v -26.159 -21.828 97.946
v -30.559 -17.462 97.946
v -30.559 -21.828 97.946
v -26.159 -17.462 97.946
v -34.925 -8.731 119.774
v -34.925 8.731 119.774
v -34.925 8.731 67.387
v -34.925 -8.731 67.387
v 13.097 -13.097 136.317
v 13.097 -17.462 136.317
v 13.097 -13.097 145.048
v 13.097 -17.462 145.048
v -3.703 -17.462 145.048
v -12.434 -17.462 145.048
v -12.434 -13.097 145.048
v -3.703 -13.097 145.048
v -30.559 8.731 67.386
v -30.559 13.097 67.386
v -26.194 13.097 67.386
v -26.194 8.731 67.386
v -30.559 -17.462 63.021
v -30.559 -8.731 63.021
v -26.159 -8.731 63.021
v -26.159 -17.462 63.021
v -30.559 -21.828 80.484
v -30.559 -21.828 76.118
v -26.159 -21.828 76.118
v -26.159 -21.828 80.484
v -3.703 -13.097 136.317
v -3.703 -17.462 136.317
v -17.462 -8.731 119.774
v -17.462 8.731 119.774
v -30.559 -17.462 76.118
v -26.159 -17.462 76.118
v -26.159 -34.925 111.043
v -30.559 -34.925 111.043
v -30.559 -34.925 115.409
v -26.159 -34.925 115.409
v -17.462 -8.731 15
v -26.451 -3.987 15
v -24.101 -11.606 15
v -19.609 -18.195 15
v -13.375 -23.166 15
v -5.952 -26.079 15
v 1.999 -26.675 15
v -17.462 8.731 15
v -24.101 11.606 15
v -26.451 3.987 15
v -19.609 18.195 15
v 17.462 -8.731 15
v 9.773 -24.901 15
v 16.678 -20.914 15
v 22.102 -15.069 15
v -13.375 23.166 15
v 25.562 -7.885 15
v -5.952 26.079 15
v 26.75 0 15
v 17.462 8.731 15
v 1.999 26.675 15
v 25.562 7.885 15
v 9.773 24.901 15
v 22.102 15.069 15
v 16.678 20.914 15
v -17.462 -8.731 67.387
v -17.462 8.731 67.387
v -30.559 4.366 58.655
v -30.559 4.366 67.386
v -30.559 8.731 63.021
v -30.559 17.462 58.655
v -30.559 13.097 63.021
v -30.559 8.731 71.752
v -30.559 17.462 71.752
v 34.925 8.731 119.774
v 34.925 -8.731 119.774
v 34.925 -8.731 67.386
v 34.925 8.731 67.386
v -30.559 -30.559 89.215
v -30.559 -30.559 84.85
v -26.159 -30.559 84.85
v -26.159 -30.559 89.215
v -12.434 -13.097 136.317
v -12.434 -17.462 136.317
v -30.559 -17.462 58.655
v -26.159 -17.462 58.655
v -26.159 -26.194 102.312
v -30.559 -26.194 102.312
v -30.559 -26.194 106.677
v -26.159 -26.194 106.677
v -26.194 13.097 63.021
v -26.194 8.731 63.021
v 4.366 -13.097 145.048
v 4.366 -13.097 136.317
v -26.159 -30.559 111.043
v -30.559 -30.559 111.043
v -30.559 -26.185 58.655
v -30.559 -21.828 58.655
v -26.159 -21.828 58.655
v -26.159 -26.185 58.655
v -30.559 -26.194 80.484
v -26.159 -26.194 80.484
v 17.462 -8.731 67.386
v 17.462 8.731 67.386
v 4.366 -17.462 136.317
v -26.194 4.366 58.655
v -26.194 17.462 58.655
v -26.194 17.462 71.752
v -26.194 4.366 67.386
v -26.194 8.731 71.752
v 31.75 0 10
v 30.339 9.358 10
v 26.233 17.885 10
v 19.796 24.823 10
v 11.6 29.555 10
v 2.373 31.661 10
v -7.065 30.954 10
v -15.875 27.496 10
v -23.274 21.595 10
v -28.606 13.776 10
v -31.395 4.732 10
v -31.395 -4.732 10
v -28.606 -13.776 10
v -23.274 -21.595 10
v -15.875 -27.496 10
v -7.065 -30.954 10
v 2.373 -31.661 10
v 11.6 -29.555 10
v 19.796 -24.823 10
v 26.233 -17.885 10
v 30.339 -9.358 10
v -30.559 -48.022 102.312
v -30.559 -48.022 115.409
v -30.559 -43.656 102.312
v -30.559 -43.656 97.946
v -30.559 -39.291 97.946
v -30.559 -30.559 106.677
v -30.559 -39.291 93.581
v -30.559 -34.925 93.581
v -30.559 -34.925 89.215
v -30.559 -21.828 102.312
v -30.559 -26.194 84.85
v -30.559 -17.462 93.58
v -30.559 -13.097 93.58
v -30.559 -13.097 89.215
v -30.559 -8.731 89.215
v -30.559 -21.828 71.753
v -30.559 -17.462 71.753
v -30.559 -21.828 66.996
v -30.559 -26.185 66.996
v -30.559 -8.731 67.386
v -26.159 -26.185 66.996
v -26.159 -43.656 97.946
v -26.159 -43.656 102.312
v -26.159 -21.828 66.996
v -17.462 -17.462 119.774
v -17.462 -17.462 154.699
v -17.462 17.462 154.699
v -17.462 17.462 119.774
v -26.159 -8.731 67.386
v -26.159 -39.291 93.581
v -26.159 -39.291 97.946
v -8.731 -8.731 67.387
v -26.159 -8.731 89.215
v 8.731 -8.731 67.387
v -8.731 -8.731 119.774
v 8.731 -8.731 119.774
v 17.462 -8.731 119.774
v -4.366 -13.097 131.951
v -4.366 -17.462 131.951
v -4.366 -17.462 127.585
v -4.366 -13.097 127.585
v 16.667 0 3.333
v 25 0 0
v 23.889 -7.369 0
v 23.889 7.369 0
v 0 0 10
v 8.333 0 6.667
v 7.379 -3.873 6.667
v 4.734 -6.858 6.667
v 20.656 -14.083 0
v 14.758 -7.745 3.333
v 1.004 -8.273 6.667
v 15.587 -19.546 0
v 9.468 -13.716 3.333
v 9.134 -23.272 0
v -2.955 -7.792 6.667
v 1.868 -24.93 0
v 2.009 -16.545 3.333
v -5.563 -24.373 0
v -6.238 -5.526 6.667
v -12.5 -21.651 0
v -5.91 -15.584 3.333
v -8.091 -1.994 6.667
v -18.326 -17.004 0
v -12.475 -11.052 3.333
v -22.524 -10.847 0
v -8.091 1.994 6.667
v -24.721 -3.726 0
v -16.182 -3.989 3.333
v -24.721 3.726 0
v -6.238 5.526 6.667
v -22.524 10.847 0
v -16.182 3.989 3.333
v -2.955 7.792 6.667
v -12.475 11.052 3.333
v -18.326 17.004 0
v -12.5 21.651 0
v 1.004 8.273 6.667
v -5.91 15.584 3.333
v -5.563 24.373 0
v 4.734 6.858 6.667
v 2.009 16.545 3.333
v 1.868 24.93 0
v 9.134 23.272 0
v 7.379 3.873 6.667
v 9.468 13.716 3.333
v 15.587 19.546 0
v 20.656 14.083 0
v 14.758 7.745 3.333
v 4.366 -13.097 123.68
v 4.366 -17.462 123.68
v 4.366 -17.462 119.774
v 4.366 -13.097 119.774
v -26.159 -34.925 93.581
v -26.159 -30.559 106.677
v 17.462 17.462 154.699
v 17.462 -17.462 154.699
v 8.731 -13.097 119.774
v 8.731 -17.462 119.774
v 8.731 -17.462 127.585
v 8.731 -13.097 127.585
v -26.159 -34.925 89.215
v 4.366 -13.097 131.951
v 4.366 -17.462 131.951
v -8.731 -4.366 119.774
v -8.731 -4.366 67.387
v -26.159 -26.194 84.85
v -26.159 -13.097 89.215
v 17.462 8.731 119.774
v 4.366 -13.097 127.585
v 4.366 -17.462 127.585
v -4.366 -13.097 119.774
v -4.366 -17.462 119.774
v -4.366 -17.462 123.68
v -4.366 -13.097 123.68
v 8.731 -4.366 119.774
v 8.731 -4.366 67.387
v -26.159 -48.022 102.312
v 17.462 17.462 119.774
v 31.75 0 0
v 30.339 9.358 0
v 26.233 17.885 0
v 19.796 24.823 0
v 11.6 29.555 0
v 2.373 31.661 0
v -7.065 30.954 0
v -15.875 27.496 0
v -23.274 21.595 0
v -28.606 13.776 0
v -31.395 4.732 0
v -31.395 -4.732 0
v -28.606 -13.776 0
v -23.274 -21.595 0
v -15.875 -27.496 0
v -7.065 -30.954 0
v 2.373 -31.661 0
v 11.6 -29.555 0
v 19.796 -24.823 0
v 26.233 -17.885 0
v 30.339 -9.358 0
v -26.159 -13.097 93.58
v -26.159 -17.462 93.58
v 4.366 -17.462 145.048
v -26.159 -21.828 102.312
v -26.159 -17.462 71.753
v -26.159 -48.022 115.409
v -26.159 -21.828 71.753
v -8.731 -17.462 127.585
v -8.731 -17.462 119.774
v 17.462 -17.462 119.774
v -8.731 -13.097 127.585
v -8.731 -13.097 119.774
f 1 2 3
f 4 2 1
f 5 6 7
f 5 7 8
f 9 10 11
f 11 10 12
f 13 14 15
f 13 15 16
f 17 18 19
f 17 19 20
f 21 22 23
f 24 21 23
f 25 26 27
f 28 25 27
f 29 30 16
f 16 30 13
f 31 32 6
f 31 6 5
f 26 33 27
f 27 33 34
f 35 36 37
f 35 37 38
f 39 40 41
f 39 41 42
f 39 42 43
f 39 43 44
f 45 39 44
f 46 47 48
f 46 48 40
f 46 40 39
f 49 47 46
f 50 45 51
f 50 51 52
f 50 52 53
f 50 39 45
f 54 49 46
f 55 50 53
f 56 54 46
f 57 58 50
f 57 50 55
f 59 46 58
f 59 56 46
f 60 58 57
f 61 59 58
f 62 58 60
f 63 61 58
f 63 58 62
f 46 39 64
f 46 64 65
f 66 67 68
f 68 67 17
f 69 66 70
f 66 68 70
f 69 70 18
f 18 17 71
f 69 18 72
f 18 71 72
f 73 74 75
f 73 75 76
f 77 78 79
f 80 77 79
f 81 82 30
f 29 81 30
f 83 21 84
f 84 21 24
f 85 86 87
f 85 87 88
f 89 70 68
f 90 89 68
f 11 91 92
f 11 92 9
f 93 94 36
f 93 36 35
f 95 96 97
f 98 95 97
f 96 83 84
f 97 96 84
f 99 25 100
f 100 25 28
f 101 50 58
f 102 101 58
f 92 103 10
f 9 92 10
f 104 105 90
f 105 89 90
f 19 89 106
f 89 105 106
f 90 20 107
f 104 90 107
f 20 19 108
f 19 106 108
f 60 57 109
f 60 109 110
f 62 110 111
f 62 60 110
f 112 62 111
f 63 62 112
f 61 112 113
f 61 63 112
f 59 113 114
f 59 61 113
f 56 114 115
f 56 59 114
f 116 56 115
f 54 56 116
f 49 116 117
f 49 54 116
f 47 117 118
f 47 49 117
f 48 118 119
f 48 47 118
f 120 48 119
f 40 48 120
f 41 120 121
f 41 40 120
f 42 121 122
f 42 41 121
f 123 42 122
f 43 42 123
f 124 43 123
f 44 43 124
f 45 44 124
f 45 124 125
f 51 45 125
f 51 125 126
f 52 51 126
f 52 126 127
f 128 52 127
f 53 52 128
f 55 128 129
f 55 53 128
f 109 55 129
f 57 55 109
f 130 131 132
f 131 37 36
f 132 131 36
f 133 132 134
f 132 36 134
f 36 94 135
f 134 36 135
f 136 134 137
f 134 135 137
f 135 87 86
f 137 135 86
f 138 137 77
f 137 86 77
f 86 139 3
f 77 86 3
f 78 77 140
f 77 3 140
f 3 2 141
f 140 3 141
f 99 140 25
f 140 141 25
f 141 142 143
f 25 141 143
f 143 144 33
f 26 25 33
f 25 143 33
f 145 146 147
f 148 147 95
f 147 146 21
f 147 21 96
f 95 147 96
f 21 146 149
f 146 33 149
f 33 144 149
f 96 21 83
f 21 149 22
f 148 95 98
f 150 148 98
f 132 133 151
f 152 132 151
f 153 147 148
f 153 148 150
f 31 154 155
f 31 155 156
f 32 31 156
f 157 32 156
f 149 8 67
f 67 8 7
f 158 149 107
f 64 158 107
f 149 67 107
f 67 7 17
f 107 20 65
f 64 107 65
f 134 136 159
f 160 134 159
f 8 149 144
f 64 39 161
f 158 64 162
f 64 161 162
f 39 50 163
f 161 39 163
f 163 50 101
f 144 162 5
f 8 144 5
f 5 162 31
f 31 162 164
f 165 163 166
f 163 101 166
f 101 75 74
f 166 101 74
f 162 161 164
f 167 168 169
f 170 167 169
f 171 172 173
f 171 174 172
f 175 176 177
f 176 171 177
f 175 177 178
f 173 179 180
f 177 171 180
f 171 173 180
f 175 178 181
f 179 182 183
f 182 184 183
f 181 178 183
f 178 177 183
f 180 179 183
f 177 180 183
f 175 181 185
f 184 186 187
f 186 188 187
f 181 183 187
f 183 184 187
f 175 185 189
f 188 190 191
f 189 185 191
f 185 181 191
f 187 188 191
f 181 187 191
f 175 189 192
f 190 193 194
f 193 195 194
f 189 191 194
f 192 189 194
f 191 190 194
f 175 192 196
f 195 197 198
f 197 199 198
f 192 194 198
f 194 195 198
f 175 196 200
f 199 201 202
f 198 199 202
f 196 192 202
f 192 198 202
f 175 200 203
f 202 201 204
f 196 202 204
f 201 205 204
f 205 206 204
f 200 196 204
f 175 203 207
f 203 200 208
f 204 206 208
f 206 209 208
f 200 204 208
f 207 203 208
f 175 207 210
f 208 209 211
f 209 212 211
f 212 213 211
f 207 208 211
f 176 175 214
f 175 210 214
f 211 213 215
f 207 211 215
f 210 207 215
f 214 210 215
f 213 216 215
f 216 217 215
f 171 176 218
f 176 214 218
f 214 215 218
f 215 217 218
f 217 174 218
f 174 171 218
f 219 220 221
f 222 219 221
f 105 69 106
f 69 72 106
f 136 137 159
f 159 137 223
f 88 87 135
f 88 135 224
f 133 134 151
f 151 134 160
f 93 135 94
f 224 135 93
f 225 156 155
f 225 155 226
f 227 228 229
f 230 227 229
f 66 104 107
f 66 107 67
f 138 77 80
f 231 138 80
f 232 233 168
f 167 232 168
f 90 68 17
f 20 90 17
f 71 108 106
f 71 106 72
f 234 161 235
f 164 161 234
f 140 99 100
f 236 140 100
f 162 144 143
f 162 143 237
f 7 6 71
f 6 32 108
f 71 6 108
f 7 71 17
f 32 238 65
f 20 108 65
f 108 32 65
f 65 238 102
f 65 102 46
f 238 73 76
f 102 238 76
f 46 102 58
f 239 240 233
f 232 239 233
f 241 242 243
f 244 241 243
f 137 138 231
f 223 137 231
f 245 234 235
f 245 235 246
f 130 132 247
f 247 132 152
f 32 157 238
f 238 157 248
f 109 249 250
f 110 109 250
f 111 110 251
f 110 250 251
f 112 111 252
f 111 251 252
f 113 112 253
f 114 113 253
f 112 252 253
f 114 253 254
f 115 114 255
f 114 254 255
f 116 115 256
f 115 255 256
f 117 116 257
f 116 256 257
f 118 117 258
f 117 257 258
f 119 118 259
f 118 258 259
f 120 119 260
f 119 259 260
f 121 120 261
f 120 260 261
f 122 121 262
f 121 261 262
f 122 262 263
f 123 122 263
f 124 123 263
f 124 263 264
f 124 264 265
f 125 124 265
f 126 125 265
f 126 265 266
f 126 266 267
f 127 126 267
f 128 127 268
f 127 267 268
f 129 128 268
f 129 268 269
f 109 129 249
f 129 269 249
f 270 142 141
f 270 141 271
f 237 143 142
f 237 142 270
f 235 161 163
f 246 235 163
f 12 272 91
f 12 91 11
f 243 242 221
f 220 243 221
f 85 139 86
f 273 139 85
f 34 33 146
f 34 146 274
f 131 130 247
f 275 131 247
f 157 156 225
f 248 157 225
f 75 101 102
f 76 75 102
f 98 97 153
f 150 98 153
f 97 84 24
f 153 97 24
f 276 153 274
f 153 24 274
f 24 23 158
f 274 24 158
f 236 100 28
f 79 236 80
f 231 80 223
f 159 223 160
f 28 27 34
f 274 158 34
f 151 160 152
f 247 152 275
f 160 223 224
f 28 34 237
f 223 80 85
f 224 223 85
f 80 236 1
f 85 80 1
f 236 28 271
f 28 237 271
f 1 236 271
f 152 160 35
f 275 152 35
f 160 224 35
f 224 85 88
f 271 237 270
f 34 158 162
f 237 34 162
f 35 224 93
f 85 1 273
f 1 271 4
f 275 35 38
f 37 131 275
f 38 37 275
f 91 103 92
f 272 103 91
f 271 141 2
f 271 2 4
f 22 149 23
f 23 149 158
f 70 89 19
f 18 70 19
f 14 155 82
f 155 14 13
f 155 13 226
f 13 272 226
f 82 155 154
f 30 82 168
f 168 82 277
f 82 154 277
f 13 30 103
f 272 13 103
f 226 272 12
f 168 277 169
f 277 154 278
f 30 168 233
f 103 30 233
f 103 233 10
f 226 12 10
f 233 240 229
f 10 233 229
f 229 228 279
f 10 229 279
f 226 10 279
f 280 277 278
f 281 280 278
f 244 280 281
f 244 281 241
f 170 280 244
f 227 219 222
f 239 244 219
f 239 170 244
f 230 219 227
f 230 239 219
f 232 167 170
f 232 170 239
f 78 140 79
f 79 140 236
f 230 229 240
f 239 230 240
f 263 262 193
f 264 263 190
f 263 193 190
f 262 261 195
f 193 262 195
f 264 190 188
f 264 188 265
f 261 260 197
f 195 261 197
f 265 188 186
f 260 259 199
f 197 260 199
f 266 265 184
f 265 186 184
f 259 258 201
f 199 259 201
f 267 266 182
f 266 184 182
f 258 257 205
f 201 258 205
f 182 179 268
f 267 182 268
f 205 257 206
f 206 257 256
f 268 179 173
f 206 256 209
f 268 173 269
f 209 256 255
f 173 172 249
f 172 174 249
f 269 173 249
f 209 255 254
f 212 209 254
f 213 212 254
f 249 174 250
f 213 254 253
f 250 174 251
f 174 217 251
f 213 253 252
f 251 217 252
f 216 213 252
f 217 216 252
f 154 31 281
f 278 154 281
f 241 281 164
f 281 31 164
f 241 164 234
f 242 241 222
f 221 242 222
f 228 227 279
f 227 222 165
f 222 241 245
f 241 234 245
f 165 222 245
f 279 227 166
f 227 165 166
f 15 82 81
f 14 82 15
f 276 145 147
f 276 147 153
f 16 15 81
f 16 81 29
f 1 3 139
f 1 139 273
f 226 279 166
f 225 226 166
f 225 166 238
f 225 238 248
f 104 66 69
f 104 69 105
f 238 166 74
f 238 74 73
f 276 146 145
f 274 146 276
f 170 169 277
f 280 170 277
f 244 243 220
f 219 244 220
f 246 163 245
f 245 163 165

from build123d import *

# Parameters (mm, degrees)
F0_R      = 31.75
F1_DEPTH  = 15
F2_SIZE   = 5
F3_R      = 25
F4_DEPTH  = 10
F5_SIZE2  = 9.99999
F5_SIZE   = 24.99999
F6_W      = 34.925
F6_H      = 17.4625
F7_DEPTH  = 104.774
F10_W     = 34.925
F10_H     = 34.925
F11_DEPTH = 34.925
F12_W     = 17.4625
F12_H     = 17.4625
F13_DEPTH = 17.4625
F14_DEPTH = 34.925
F15_W     = 17.4625
F15_H     = 17.4625
F15_H_2   = 34.925
F16_DEPTH = 17.4625
F19_W     = 8.73125
F19_H     = 8.73125
F20_DEPTH = 4.365625
F17_W     = 4.365625
F17_H     = 4.365625
F23_DEPTH = 4.365625
F24_DEPTH = 4.365625
F25_W     = 4.4006995887
F25_H     = 4.365625
F26_DEPTH = 4.365625
F27_DEPTH = 8.73125
F28_W     = 4.4006995887
F28_H     = 4.365625
F29_DEPTH = 4.365625
F30_W     = 4.4006995887
F30_H     = 4.365625
F31_DEPTH = 4.365625
F32_W     = 4.4006995887
F32_H     = 4.365
F33_DEPTH = 4.365625
F34_DEPTH = 8.73125
F35_W     = 4.4006995887
F35_H     = 4.365
F36_DEPTH = 4.365625
F37_DEPTH = 8.73125
F38_W     = 4.4006995887
F38_H     = 4.365
F39_DEPTH = 4.365625
F40_DEPTH = 8.73125
F42_W     = 4.365625
F42_H     = 4.365625
F43_DEPTH = 4.365625
F44_DEPTH = 4.365625
F46_DEPTH = 8.73125
F47_W     = 4.365625
F47_H     = 4.365625
F48_DEPTH = 25
F41_W     = 4.4006995887
F41_H     = 4.365
F49_DEPTH = 4.365625
F50_DEPTH = 8.73125
F51_W     = 4.4006995887
F51_H     = 4.365
F52_DEPTH = 4.365625
F53_DEPTH = 8.73215
F54_W     = 4.4006995887
F54_H     = 4.3659
F55_DEPTH = 4.365625
F56_DEPTH = 4.365625
F57_W     = 4.4006995887
F57_H     = 4.365625
F58_DEPTH = 4.365625
F59_W     = 4.4006995887
F59_H     = 8.73125
F60_DEPTH = 4.365625
F61_DEPTH = 4.365625
F62_DEPTH = 4.365625
F63_DEPTH = 4.365625
F64_W     = 4.4006995887
F64_H     = 8.73125
F65_DEPTH = 4.365625
F66_W     = 4.4006995887
F66_H     = 4.36625
F66_H_2   = 4.365625
F67_DEPTH = 4.365625
F68_W     = 4.4006995887
F68_H     = 4.365625
F69_DEPTH = 4.365625
F70_W     = 4.4006995887
F70_H     = 4.4238492846
F70_H_2   = 3.9164990911
F71_DEPTH = 4.3565625
F21_W     = 17.4625
F21_H     = 52.3875
F72_DEPTH = 4.365625


# Not quite as in the source:
# - a fillet or chamfer is up to 0.001 mm smaller than in the source, because OpenCascade refuses the exact size


with BuildPart() as f1:
    # F0 (on Top) → F1 (new body)
    with BuildSketch(Plane.XY):
        Circle(F0_R)
    extrude(amount=F1_DEPTH)

    # F2
    f2_edges = [f1.edges().sort_by_distance(p)[0] for p in [
        (-31.75, 0, 15),
    ]]
    chamfer(f2_edges, length=F2_SIZE)

    # F3 (on face) → F4 (cut)
    with BuildSketch(Plane(origin=(0, 0, 0), x_dir=(1, 0, 0), z_dir=(0, 0, -1))):
        Circle(F3_R)
    extrude(amount=-F4_DEPTH, mode=Mode.SUBTRACT)

    # F5 (size 25 and 10 in the source; OpenCascade refuses exactly that, so slightly less here)
    f5_edges = [f1.edges().sort_by_distance(p)[0] for p in [
        (-25, 0, 10),
    ]]
    f5_side = f1.faces().sort_by_distance((0, 0, 10))[0]
    chamfer(f5_edges, length=F5_SIZE, length2=F5_SIZE2, reference=f5_side)

    # F6 (on face) → F7 (join)
    with BuildSketch(Plane.XY.offset(15)):
        Rectangle(F6_W, F6_H)
    extrude(amount=F7_DEPTH)

    # F10 (on face) → F11 (join)
    with BuildSketch(Plane.XY.offset(119.774)):
        Rectangle(F10_W, F10_H)
    extrude(amount=F11_DEPTH)

    # F12 (on face) → F13 (join)
    with BuildSketch(Plane.YZ.offset(17.4625)):
        with Locations((0, 111.04275)):
            Rectangle(F12_W, F12_H)
    extrude(amount=F13_DEPTH)

    # F14 (add): a face of the model
    f14_faces = [f1.faces().sort_by_distance(p)[0] for p in [
        (26.19375, 0, 102.3115),
    ]]
    extrude(f14_faces, amount=F14_DEPTH)

    # F15 (on face) → F16 (join)
    with BuildSketch(Plane(origin=(-17.4625, 0, 0), x_dir=(0, -1, 0), z_dir=(-1, 0, 0))):
        with Locations((0, 111.04275)):
            Rectangle(F15_W, F15_H)
        with Locations((0, 84.849)):
            Rectangle(F15_W, F15_H_2)
    extrude(amount=F16_DEPTH)

    # F19 (on face) → F20 (cut)
    with BuildSketch(Plane.XZ.offset(17.4625)):
        Polygon((-8.73125, 127.5853067636), (-8.73125, 119.774), (-4.365625, 119.774), (-4.365625, 123.6796533818), (4.365625, 123.6796533818), (4.365625, 119.774), (8.73125, 119.774), (8.73125, 127.5853067636), (4.365625, 127.5853067636), (4.365625, 131.9509317636), (-4.365625, 131.9509317636), (-4.365625, 127.5853067636), align=None)
        with Locations((-8.068405883, 140.6821817636)):
            Rectangle(F19_W, F19_H)
        with Locations((8.73125, 140.6821817636)):
            Rectangle(F19_W, F19_H)
    extrude(amount=-F20_DEPTH, mode=Mode.SUBTRACT)

    # F17 (on face) → F23 (join)
    with BuildSketch(Plane(origin=(0, 8.73125, 0), x_dir=(-1, 0, 0), z_dir=(0, 1, 0))):
        with Locations((28.3765625, 69.5693125)):
            Rectangle(F17_W, F17_H)
    extrude(amount=F23_DEPTH)

    # F24 (add): a face of the model
    f24_faces = [f1.faces().sort_by_distance(p)[0] for p in [
        (-28.3765625, 10.9140625, 71.752125),
    ]]
    extrude(f24_faces, amount=F24_DEPTH)

    # F25 (on face) → F26 (join)
    with BuildSketch(Plane.XZ.offset(8.73125)):
        with Locations((-28.3590252057, 69.5693125)):
            Rectangle(F25_W, F25_H)
    extrude(amount=F26_DEPTH)

    # F27 (add): a face of the model
    f27_faces = [f1.faces().sort_by_distance(p)[0] for p in [
        (-28.3590252057, -10.9140625, 71.752125),
    ]]
    extrude(f27_faces, amount=F27_DEPTH)

    # F28 (on face) → F29 (join)
    with BuildSketch(Plane.XZ.offset(13.096875)):
        with Locations((-28.3590252057, 73.9349375)):
            Rectangle(F28_W, F28_H)
        with Locations((-28.3590252057, 78.3005625)):
            Rectangle(F28_W, F28_H)
    extrude(amount=F29_DEPTH)

    # F30 (on face) → F31 (join)
    with BuildSketch(Plane.XY.offset(80.483375)):
        with Locations((-28.3590252057, -15.2796875)):
            Rectangle(F30_W, F30_H)
    extrude(amount=F31_DEPTH)

    # F32 (on face) → F33 (join)
    with BuildSketch(Plane.XZ.offset(17.4625)):
        with Locations((-28.3590252057, 78.300875)):
            Rectangle(F32_W, F32_H)
    extrude(amount=F33_DEPTH)

    # F34 (add): a face of the model
    f34_faces = [f1.faces().sort_by_distance(p)[0] for p in [
        (-28.3590252057, -19.6453125, 80.483375),
    ]]
    extrude(f34_faces, amount=F34_DEPTH)

    # F35 (on face) → F36 (join)
    with BuildSketch(Plane.XZ.offset(21.828125)):
        with Locations((-28.3590252057, 82.6665)):
            Rectangle(F35_W, F35_H)
    extrude(amount=F36_DEPTH)

    # F37 (add): a face of the model
    f37_faces = [f1.faces().sort_by_distance(p)[0] for p in [
        (-28.3590252057, -24.0109375, 84.849),
    ]]
    extrude(f37_faces, amount=F37_DEPTH)

    # F38 (on face) → F39 (join)
    with BuildSketch(Plane.XZ.offset(26.19375)):
        with Locations((-28.3590252057, 87.032125)):
            Rectangle(F38_W, F38_H)
    extrude(amount=F39_DEPTH)

    # F40 (add): a face of the model
    f40_faces = [f1.faces().sort_by_distance(p)[0] for p in [
        (-28.3590252057, -28.3765625, 89.214625),
    ]]
    extrude(f40_faces, amount=F40_DEPTH)

    # F42 (on face) → F43 (cut)
    with BuildSketch(Plane(origin=(0, 13.096875, 0), x_dir=(-1, 0, 0), z_dir=(0, 1, 0))):
        with Locations((28.3765625, 73.9349375)):
            Rectangle(F42_W, F42_H)
    extrude(amount=-F43_DEPTH, mode=Mode.SUBTRACT)

    # F44 (add): a face of the model
    f44_faces = [f1.faces().sort_by_distance(p)[0] for p in [
        (-28.3765625, 13.096875, 69.5693125),
    ]]
    extrude(f44_faces, amount=F44_DEPTH)

    # F45 (on face) → F46 (join)
    with BuildSketch(Plane(origin=(0, 0, 67.3865), x_dir=(1, 0, 0), z_dir=(0, 0, -1))):
        Polygon((-30.559375, -4.365625), (-30.559375, -8.73125), (-30.559375, -17.4625), (-26.19375, -17.4625), (-26.19375, -8.73125), (-26.19375, -4.365625), align=None)
    extrude(amount=F46_DEPTH)

    # F47 (on face) → F48 (cut)
    with BuildSketch(Plane(origin=(-30.559375, 0, 0), x_dir=(0, -1, 0), z_dir=(-1, 0, 0))):
        with Locations((-10.9140625, 65.2036875)):
            Rectangle(F47_W, F47_H)
    extrude(amount=-F48_DEPTH, mode=Mode.SUBTRACT)

    # F41 (on face) → F49 (join)
    with BuildSketch(Plane.XZ.offset(30.559375)):
        with Locations((-28.3590252057, 91.39775)):
            Rectangle(F41_W, F41_H)
    extrude(amount=F49_DEPTH)

    # F50 (add): a face of the model
    f50_faces = [f1.faces().sort_by_distance(p)[0] for p in [
        (-28.3590252057, -32.7421875, 93.58025),
    ]]
    extrude(f50_faces, amount=F50_DEPTH)

    # F51 (on face) → F52 (join)
    with BuildSketch(Plane.XZ.offset(34.925)):
        with Locations((-28.3590252057, 95.763375)):
            Rectangle(F51_W, F51_H)
    extrude(amount=F52_DEPTH)

    # F53 (add): a face of the model
    f53_faces = [f1.faces().sort_by_distance(p)[0] for p in [
        (-28.3590252057, -37.1078125, 97.945875),
    ]]
    extrude(f53_faces, amount=F53_DEPTH)

    # F54 (on face) → F55 (join)
    with BuildSketch(Plane.XZ.offset(39.290625)):
        with Locations((-28.3590252057, 100.12945)):
            Rectangle(F54_W, F54_H)
    extrude(amount=F55_DEPTH)

    # F56 (add): a face of the model
    f56_faces = [f1.faces().sort_by_distance(p)[0] for p in [
        (-28.3590252057, -41.4734375, 102.3124),
    ]]
    extrude(f56_faces, amount=F56_DEPTH)

    # F57 (on face) → F58 (join)
    with BuildSketch(Plane.XZ.offset(43.65625)):
        with Locations((-28.3590252057, 104.4952125)):
            Rectangle(F57_W, F57_H)
    extrude(amount=F58_DEPTH)

    # F59 (on face) → F60 (join)
    with BuildSketch(Plane.XY.offset(106.678025)):
        with Locations((-28.3590252057, -43.65625)):
            Rectangle(F59_W, F59_H)
    extrude(amount=F60_DEPTH)

    # F61 (add): faces of the model
    f61_faces = [f1.faces().sort_by_distance(p)[0] for p in [
        (-28.3590252057, -10.9140625, 80.483375),
        (-28.3590252057, -15.2796875, 84.849),
        (-28.3590252057, -19.6453125, 89.214625),
        (-28.3590252057, -24.0109375, 93.58025),
        (-28.3590252057, -28.3765625, 97.945875),
        (-28.3590252057, -32.7421875, 102.3115),
        (-28.3590252057, -37.1078125, 106.678025),
        (-28.3590252057, -43.65625, 111.04365),
    ]]
    extrude(f61_faces, amount=F61_DEPTH)

    # F62 (add): faces of the model
    f62_faces = [f1.faces().sort_by_distance(p)[0] for p in [
        (-28.3590252057, -10.9140625, 84.849),
        (-28.3590252057, -15.2796875, 89.214625),
        (-28.3590252057, -19.6453125, 93.58025),
        (-28.3590252057, -24.0109375, 97.945875),
        (-28.3590252057, -28.3765625, 102.3115),
        (-28.3590252057, -32.7421875, 106.677125),
        (-28.3590252057, -37.1078125, 111.04365),
    ]]
    extrude(f62_faces, amount=F62_DEPTH)

    # F63 (add): a face of the model
    f63_faces = [f1.faces().sort_by_distance(p)[0] for p in [
        (-28.3590252057, -15.2796875, 71.752125),
    ]]
    extrude(f63_faces, amount=F63_DEPTH)

    # F64 (on face) → F65 (join)
    with BuildSketch(Plane(origin=(0, 0, 67.3865), x_dir=(1, 0, 0), z_dir=(0, 0, -1))):
        with Locations((-28.3590252057, 13.096875)):
            Rectangle(F64_W, F64_H)
    extrude(amount=F65_DEPTH)

    # F66 (on face) → F67 (join)
    with BuildSketch(Plane.XZ.offset(17.4625)):
        with Locations((-28.3590252057, 69.569625)):
            Rectangle(F66_W, F66_H)
        with Locations((-28.3590252057, 65.2036875)):
            Rectangle(F66_W, F66_H_2)
    extrude(amount=F67_DEPTH)

    # F68 (on face) → F69 (join)
    with BuildSketch(Plane(origin=(0, 0, 63.020875), x_dir=(1, 0, 0), z_dir=(0, 0, -1))):
        with Locations((-28.3590252057, 19.6453125)):
            Rectangle(F68_W, F68_H)
    extrude(amount=F69_DEPTH)

    # F70 (on face) → F71 (join)
    with BuildSketch(Plane.XZ.offset(21.828125)):
        with Locations((-28.3590252057, 64.7836737335)):
            Rectangle(F70_W, F70_H)
        with Locations((-28.3590252057, 60.6134995456)):
            Rectangle(F70_W, F70_H_2)
    extrude(amount=F71_DEPTH)

    # F21 (on face) → F72 (cut)
    with BuildSketch(Plane.XZ.offset(8.73125)):
        with Locations((0, 93.58025)):
            Rectangle(F21_W, F21_H)
    extrude(amount=-F72_DEPTH, mode=Mode.SUBTRACT)


solid = f1.part
